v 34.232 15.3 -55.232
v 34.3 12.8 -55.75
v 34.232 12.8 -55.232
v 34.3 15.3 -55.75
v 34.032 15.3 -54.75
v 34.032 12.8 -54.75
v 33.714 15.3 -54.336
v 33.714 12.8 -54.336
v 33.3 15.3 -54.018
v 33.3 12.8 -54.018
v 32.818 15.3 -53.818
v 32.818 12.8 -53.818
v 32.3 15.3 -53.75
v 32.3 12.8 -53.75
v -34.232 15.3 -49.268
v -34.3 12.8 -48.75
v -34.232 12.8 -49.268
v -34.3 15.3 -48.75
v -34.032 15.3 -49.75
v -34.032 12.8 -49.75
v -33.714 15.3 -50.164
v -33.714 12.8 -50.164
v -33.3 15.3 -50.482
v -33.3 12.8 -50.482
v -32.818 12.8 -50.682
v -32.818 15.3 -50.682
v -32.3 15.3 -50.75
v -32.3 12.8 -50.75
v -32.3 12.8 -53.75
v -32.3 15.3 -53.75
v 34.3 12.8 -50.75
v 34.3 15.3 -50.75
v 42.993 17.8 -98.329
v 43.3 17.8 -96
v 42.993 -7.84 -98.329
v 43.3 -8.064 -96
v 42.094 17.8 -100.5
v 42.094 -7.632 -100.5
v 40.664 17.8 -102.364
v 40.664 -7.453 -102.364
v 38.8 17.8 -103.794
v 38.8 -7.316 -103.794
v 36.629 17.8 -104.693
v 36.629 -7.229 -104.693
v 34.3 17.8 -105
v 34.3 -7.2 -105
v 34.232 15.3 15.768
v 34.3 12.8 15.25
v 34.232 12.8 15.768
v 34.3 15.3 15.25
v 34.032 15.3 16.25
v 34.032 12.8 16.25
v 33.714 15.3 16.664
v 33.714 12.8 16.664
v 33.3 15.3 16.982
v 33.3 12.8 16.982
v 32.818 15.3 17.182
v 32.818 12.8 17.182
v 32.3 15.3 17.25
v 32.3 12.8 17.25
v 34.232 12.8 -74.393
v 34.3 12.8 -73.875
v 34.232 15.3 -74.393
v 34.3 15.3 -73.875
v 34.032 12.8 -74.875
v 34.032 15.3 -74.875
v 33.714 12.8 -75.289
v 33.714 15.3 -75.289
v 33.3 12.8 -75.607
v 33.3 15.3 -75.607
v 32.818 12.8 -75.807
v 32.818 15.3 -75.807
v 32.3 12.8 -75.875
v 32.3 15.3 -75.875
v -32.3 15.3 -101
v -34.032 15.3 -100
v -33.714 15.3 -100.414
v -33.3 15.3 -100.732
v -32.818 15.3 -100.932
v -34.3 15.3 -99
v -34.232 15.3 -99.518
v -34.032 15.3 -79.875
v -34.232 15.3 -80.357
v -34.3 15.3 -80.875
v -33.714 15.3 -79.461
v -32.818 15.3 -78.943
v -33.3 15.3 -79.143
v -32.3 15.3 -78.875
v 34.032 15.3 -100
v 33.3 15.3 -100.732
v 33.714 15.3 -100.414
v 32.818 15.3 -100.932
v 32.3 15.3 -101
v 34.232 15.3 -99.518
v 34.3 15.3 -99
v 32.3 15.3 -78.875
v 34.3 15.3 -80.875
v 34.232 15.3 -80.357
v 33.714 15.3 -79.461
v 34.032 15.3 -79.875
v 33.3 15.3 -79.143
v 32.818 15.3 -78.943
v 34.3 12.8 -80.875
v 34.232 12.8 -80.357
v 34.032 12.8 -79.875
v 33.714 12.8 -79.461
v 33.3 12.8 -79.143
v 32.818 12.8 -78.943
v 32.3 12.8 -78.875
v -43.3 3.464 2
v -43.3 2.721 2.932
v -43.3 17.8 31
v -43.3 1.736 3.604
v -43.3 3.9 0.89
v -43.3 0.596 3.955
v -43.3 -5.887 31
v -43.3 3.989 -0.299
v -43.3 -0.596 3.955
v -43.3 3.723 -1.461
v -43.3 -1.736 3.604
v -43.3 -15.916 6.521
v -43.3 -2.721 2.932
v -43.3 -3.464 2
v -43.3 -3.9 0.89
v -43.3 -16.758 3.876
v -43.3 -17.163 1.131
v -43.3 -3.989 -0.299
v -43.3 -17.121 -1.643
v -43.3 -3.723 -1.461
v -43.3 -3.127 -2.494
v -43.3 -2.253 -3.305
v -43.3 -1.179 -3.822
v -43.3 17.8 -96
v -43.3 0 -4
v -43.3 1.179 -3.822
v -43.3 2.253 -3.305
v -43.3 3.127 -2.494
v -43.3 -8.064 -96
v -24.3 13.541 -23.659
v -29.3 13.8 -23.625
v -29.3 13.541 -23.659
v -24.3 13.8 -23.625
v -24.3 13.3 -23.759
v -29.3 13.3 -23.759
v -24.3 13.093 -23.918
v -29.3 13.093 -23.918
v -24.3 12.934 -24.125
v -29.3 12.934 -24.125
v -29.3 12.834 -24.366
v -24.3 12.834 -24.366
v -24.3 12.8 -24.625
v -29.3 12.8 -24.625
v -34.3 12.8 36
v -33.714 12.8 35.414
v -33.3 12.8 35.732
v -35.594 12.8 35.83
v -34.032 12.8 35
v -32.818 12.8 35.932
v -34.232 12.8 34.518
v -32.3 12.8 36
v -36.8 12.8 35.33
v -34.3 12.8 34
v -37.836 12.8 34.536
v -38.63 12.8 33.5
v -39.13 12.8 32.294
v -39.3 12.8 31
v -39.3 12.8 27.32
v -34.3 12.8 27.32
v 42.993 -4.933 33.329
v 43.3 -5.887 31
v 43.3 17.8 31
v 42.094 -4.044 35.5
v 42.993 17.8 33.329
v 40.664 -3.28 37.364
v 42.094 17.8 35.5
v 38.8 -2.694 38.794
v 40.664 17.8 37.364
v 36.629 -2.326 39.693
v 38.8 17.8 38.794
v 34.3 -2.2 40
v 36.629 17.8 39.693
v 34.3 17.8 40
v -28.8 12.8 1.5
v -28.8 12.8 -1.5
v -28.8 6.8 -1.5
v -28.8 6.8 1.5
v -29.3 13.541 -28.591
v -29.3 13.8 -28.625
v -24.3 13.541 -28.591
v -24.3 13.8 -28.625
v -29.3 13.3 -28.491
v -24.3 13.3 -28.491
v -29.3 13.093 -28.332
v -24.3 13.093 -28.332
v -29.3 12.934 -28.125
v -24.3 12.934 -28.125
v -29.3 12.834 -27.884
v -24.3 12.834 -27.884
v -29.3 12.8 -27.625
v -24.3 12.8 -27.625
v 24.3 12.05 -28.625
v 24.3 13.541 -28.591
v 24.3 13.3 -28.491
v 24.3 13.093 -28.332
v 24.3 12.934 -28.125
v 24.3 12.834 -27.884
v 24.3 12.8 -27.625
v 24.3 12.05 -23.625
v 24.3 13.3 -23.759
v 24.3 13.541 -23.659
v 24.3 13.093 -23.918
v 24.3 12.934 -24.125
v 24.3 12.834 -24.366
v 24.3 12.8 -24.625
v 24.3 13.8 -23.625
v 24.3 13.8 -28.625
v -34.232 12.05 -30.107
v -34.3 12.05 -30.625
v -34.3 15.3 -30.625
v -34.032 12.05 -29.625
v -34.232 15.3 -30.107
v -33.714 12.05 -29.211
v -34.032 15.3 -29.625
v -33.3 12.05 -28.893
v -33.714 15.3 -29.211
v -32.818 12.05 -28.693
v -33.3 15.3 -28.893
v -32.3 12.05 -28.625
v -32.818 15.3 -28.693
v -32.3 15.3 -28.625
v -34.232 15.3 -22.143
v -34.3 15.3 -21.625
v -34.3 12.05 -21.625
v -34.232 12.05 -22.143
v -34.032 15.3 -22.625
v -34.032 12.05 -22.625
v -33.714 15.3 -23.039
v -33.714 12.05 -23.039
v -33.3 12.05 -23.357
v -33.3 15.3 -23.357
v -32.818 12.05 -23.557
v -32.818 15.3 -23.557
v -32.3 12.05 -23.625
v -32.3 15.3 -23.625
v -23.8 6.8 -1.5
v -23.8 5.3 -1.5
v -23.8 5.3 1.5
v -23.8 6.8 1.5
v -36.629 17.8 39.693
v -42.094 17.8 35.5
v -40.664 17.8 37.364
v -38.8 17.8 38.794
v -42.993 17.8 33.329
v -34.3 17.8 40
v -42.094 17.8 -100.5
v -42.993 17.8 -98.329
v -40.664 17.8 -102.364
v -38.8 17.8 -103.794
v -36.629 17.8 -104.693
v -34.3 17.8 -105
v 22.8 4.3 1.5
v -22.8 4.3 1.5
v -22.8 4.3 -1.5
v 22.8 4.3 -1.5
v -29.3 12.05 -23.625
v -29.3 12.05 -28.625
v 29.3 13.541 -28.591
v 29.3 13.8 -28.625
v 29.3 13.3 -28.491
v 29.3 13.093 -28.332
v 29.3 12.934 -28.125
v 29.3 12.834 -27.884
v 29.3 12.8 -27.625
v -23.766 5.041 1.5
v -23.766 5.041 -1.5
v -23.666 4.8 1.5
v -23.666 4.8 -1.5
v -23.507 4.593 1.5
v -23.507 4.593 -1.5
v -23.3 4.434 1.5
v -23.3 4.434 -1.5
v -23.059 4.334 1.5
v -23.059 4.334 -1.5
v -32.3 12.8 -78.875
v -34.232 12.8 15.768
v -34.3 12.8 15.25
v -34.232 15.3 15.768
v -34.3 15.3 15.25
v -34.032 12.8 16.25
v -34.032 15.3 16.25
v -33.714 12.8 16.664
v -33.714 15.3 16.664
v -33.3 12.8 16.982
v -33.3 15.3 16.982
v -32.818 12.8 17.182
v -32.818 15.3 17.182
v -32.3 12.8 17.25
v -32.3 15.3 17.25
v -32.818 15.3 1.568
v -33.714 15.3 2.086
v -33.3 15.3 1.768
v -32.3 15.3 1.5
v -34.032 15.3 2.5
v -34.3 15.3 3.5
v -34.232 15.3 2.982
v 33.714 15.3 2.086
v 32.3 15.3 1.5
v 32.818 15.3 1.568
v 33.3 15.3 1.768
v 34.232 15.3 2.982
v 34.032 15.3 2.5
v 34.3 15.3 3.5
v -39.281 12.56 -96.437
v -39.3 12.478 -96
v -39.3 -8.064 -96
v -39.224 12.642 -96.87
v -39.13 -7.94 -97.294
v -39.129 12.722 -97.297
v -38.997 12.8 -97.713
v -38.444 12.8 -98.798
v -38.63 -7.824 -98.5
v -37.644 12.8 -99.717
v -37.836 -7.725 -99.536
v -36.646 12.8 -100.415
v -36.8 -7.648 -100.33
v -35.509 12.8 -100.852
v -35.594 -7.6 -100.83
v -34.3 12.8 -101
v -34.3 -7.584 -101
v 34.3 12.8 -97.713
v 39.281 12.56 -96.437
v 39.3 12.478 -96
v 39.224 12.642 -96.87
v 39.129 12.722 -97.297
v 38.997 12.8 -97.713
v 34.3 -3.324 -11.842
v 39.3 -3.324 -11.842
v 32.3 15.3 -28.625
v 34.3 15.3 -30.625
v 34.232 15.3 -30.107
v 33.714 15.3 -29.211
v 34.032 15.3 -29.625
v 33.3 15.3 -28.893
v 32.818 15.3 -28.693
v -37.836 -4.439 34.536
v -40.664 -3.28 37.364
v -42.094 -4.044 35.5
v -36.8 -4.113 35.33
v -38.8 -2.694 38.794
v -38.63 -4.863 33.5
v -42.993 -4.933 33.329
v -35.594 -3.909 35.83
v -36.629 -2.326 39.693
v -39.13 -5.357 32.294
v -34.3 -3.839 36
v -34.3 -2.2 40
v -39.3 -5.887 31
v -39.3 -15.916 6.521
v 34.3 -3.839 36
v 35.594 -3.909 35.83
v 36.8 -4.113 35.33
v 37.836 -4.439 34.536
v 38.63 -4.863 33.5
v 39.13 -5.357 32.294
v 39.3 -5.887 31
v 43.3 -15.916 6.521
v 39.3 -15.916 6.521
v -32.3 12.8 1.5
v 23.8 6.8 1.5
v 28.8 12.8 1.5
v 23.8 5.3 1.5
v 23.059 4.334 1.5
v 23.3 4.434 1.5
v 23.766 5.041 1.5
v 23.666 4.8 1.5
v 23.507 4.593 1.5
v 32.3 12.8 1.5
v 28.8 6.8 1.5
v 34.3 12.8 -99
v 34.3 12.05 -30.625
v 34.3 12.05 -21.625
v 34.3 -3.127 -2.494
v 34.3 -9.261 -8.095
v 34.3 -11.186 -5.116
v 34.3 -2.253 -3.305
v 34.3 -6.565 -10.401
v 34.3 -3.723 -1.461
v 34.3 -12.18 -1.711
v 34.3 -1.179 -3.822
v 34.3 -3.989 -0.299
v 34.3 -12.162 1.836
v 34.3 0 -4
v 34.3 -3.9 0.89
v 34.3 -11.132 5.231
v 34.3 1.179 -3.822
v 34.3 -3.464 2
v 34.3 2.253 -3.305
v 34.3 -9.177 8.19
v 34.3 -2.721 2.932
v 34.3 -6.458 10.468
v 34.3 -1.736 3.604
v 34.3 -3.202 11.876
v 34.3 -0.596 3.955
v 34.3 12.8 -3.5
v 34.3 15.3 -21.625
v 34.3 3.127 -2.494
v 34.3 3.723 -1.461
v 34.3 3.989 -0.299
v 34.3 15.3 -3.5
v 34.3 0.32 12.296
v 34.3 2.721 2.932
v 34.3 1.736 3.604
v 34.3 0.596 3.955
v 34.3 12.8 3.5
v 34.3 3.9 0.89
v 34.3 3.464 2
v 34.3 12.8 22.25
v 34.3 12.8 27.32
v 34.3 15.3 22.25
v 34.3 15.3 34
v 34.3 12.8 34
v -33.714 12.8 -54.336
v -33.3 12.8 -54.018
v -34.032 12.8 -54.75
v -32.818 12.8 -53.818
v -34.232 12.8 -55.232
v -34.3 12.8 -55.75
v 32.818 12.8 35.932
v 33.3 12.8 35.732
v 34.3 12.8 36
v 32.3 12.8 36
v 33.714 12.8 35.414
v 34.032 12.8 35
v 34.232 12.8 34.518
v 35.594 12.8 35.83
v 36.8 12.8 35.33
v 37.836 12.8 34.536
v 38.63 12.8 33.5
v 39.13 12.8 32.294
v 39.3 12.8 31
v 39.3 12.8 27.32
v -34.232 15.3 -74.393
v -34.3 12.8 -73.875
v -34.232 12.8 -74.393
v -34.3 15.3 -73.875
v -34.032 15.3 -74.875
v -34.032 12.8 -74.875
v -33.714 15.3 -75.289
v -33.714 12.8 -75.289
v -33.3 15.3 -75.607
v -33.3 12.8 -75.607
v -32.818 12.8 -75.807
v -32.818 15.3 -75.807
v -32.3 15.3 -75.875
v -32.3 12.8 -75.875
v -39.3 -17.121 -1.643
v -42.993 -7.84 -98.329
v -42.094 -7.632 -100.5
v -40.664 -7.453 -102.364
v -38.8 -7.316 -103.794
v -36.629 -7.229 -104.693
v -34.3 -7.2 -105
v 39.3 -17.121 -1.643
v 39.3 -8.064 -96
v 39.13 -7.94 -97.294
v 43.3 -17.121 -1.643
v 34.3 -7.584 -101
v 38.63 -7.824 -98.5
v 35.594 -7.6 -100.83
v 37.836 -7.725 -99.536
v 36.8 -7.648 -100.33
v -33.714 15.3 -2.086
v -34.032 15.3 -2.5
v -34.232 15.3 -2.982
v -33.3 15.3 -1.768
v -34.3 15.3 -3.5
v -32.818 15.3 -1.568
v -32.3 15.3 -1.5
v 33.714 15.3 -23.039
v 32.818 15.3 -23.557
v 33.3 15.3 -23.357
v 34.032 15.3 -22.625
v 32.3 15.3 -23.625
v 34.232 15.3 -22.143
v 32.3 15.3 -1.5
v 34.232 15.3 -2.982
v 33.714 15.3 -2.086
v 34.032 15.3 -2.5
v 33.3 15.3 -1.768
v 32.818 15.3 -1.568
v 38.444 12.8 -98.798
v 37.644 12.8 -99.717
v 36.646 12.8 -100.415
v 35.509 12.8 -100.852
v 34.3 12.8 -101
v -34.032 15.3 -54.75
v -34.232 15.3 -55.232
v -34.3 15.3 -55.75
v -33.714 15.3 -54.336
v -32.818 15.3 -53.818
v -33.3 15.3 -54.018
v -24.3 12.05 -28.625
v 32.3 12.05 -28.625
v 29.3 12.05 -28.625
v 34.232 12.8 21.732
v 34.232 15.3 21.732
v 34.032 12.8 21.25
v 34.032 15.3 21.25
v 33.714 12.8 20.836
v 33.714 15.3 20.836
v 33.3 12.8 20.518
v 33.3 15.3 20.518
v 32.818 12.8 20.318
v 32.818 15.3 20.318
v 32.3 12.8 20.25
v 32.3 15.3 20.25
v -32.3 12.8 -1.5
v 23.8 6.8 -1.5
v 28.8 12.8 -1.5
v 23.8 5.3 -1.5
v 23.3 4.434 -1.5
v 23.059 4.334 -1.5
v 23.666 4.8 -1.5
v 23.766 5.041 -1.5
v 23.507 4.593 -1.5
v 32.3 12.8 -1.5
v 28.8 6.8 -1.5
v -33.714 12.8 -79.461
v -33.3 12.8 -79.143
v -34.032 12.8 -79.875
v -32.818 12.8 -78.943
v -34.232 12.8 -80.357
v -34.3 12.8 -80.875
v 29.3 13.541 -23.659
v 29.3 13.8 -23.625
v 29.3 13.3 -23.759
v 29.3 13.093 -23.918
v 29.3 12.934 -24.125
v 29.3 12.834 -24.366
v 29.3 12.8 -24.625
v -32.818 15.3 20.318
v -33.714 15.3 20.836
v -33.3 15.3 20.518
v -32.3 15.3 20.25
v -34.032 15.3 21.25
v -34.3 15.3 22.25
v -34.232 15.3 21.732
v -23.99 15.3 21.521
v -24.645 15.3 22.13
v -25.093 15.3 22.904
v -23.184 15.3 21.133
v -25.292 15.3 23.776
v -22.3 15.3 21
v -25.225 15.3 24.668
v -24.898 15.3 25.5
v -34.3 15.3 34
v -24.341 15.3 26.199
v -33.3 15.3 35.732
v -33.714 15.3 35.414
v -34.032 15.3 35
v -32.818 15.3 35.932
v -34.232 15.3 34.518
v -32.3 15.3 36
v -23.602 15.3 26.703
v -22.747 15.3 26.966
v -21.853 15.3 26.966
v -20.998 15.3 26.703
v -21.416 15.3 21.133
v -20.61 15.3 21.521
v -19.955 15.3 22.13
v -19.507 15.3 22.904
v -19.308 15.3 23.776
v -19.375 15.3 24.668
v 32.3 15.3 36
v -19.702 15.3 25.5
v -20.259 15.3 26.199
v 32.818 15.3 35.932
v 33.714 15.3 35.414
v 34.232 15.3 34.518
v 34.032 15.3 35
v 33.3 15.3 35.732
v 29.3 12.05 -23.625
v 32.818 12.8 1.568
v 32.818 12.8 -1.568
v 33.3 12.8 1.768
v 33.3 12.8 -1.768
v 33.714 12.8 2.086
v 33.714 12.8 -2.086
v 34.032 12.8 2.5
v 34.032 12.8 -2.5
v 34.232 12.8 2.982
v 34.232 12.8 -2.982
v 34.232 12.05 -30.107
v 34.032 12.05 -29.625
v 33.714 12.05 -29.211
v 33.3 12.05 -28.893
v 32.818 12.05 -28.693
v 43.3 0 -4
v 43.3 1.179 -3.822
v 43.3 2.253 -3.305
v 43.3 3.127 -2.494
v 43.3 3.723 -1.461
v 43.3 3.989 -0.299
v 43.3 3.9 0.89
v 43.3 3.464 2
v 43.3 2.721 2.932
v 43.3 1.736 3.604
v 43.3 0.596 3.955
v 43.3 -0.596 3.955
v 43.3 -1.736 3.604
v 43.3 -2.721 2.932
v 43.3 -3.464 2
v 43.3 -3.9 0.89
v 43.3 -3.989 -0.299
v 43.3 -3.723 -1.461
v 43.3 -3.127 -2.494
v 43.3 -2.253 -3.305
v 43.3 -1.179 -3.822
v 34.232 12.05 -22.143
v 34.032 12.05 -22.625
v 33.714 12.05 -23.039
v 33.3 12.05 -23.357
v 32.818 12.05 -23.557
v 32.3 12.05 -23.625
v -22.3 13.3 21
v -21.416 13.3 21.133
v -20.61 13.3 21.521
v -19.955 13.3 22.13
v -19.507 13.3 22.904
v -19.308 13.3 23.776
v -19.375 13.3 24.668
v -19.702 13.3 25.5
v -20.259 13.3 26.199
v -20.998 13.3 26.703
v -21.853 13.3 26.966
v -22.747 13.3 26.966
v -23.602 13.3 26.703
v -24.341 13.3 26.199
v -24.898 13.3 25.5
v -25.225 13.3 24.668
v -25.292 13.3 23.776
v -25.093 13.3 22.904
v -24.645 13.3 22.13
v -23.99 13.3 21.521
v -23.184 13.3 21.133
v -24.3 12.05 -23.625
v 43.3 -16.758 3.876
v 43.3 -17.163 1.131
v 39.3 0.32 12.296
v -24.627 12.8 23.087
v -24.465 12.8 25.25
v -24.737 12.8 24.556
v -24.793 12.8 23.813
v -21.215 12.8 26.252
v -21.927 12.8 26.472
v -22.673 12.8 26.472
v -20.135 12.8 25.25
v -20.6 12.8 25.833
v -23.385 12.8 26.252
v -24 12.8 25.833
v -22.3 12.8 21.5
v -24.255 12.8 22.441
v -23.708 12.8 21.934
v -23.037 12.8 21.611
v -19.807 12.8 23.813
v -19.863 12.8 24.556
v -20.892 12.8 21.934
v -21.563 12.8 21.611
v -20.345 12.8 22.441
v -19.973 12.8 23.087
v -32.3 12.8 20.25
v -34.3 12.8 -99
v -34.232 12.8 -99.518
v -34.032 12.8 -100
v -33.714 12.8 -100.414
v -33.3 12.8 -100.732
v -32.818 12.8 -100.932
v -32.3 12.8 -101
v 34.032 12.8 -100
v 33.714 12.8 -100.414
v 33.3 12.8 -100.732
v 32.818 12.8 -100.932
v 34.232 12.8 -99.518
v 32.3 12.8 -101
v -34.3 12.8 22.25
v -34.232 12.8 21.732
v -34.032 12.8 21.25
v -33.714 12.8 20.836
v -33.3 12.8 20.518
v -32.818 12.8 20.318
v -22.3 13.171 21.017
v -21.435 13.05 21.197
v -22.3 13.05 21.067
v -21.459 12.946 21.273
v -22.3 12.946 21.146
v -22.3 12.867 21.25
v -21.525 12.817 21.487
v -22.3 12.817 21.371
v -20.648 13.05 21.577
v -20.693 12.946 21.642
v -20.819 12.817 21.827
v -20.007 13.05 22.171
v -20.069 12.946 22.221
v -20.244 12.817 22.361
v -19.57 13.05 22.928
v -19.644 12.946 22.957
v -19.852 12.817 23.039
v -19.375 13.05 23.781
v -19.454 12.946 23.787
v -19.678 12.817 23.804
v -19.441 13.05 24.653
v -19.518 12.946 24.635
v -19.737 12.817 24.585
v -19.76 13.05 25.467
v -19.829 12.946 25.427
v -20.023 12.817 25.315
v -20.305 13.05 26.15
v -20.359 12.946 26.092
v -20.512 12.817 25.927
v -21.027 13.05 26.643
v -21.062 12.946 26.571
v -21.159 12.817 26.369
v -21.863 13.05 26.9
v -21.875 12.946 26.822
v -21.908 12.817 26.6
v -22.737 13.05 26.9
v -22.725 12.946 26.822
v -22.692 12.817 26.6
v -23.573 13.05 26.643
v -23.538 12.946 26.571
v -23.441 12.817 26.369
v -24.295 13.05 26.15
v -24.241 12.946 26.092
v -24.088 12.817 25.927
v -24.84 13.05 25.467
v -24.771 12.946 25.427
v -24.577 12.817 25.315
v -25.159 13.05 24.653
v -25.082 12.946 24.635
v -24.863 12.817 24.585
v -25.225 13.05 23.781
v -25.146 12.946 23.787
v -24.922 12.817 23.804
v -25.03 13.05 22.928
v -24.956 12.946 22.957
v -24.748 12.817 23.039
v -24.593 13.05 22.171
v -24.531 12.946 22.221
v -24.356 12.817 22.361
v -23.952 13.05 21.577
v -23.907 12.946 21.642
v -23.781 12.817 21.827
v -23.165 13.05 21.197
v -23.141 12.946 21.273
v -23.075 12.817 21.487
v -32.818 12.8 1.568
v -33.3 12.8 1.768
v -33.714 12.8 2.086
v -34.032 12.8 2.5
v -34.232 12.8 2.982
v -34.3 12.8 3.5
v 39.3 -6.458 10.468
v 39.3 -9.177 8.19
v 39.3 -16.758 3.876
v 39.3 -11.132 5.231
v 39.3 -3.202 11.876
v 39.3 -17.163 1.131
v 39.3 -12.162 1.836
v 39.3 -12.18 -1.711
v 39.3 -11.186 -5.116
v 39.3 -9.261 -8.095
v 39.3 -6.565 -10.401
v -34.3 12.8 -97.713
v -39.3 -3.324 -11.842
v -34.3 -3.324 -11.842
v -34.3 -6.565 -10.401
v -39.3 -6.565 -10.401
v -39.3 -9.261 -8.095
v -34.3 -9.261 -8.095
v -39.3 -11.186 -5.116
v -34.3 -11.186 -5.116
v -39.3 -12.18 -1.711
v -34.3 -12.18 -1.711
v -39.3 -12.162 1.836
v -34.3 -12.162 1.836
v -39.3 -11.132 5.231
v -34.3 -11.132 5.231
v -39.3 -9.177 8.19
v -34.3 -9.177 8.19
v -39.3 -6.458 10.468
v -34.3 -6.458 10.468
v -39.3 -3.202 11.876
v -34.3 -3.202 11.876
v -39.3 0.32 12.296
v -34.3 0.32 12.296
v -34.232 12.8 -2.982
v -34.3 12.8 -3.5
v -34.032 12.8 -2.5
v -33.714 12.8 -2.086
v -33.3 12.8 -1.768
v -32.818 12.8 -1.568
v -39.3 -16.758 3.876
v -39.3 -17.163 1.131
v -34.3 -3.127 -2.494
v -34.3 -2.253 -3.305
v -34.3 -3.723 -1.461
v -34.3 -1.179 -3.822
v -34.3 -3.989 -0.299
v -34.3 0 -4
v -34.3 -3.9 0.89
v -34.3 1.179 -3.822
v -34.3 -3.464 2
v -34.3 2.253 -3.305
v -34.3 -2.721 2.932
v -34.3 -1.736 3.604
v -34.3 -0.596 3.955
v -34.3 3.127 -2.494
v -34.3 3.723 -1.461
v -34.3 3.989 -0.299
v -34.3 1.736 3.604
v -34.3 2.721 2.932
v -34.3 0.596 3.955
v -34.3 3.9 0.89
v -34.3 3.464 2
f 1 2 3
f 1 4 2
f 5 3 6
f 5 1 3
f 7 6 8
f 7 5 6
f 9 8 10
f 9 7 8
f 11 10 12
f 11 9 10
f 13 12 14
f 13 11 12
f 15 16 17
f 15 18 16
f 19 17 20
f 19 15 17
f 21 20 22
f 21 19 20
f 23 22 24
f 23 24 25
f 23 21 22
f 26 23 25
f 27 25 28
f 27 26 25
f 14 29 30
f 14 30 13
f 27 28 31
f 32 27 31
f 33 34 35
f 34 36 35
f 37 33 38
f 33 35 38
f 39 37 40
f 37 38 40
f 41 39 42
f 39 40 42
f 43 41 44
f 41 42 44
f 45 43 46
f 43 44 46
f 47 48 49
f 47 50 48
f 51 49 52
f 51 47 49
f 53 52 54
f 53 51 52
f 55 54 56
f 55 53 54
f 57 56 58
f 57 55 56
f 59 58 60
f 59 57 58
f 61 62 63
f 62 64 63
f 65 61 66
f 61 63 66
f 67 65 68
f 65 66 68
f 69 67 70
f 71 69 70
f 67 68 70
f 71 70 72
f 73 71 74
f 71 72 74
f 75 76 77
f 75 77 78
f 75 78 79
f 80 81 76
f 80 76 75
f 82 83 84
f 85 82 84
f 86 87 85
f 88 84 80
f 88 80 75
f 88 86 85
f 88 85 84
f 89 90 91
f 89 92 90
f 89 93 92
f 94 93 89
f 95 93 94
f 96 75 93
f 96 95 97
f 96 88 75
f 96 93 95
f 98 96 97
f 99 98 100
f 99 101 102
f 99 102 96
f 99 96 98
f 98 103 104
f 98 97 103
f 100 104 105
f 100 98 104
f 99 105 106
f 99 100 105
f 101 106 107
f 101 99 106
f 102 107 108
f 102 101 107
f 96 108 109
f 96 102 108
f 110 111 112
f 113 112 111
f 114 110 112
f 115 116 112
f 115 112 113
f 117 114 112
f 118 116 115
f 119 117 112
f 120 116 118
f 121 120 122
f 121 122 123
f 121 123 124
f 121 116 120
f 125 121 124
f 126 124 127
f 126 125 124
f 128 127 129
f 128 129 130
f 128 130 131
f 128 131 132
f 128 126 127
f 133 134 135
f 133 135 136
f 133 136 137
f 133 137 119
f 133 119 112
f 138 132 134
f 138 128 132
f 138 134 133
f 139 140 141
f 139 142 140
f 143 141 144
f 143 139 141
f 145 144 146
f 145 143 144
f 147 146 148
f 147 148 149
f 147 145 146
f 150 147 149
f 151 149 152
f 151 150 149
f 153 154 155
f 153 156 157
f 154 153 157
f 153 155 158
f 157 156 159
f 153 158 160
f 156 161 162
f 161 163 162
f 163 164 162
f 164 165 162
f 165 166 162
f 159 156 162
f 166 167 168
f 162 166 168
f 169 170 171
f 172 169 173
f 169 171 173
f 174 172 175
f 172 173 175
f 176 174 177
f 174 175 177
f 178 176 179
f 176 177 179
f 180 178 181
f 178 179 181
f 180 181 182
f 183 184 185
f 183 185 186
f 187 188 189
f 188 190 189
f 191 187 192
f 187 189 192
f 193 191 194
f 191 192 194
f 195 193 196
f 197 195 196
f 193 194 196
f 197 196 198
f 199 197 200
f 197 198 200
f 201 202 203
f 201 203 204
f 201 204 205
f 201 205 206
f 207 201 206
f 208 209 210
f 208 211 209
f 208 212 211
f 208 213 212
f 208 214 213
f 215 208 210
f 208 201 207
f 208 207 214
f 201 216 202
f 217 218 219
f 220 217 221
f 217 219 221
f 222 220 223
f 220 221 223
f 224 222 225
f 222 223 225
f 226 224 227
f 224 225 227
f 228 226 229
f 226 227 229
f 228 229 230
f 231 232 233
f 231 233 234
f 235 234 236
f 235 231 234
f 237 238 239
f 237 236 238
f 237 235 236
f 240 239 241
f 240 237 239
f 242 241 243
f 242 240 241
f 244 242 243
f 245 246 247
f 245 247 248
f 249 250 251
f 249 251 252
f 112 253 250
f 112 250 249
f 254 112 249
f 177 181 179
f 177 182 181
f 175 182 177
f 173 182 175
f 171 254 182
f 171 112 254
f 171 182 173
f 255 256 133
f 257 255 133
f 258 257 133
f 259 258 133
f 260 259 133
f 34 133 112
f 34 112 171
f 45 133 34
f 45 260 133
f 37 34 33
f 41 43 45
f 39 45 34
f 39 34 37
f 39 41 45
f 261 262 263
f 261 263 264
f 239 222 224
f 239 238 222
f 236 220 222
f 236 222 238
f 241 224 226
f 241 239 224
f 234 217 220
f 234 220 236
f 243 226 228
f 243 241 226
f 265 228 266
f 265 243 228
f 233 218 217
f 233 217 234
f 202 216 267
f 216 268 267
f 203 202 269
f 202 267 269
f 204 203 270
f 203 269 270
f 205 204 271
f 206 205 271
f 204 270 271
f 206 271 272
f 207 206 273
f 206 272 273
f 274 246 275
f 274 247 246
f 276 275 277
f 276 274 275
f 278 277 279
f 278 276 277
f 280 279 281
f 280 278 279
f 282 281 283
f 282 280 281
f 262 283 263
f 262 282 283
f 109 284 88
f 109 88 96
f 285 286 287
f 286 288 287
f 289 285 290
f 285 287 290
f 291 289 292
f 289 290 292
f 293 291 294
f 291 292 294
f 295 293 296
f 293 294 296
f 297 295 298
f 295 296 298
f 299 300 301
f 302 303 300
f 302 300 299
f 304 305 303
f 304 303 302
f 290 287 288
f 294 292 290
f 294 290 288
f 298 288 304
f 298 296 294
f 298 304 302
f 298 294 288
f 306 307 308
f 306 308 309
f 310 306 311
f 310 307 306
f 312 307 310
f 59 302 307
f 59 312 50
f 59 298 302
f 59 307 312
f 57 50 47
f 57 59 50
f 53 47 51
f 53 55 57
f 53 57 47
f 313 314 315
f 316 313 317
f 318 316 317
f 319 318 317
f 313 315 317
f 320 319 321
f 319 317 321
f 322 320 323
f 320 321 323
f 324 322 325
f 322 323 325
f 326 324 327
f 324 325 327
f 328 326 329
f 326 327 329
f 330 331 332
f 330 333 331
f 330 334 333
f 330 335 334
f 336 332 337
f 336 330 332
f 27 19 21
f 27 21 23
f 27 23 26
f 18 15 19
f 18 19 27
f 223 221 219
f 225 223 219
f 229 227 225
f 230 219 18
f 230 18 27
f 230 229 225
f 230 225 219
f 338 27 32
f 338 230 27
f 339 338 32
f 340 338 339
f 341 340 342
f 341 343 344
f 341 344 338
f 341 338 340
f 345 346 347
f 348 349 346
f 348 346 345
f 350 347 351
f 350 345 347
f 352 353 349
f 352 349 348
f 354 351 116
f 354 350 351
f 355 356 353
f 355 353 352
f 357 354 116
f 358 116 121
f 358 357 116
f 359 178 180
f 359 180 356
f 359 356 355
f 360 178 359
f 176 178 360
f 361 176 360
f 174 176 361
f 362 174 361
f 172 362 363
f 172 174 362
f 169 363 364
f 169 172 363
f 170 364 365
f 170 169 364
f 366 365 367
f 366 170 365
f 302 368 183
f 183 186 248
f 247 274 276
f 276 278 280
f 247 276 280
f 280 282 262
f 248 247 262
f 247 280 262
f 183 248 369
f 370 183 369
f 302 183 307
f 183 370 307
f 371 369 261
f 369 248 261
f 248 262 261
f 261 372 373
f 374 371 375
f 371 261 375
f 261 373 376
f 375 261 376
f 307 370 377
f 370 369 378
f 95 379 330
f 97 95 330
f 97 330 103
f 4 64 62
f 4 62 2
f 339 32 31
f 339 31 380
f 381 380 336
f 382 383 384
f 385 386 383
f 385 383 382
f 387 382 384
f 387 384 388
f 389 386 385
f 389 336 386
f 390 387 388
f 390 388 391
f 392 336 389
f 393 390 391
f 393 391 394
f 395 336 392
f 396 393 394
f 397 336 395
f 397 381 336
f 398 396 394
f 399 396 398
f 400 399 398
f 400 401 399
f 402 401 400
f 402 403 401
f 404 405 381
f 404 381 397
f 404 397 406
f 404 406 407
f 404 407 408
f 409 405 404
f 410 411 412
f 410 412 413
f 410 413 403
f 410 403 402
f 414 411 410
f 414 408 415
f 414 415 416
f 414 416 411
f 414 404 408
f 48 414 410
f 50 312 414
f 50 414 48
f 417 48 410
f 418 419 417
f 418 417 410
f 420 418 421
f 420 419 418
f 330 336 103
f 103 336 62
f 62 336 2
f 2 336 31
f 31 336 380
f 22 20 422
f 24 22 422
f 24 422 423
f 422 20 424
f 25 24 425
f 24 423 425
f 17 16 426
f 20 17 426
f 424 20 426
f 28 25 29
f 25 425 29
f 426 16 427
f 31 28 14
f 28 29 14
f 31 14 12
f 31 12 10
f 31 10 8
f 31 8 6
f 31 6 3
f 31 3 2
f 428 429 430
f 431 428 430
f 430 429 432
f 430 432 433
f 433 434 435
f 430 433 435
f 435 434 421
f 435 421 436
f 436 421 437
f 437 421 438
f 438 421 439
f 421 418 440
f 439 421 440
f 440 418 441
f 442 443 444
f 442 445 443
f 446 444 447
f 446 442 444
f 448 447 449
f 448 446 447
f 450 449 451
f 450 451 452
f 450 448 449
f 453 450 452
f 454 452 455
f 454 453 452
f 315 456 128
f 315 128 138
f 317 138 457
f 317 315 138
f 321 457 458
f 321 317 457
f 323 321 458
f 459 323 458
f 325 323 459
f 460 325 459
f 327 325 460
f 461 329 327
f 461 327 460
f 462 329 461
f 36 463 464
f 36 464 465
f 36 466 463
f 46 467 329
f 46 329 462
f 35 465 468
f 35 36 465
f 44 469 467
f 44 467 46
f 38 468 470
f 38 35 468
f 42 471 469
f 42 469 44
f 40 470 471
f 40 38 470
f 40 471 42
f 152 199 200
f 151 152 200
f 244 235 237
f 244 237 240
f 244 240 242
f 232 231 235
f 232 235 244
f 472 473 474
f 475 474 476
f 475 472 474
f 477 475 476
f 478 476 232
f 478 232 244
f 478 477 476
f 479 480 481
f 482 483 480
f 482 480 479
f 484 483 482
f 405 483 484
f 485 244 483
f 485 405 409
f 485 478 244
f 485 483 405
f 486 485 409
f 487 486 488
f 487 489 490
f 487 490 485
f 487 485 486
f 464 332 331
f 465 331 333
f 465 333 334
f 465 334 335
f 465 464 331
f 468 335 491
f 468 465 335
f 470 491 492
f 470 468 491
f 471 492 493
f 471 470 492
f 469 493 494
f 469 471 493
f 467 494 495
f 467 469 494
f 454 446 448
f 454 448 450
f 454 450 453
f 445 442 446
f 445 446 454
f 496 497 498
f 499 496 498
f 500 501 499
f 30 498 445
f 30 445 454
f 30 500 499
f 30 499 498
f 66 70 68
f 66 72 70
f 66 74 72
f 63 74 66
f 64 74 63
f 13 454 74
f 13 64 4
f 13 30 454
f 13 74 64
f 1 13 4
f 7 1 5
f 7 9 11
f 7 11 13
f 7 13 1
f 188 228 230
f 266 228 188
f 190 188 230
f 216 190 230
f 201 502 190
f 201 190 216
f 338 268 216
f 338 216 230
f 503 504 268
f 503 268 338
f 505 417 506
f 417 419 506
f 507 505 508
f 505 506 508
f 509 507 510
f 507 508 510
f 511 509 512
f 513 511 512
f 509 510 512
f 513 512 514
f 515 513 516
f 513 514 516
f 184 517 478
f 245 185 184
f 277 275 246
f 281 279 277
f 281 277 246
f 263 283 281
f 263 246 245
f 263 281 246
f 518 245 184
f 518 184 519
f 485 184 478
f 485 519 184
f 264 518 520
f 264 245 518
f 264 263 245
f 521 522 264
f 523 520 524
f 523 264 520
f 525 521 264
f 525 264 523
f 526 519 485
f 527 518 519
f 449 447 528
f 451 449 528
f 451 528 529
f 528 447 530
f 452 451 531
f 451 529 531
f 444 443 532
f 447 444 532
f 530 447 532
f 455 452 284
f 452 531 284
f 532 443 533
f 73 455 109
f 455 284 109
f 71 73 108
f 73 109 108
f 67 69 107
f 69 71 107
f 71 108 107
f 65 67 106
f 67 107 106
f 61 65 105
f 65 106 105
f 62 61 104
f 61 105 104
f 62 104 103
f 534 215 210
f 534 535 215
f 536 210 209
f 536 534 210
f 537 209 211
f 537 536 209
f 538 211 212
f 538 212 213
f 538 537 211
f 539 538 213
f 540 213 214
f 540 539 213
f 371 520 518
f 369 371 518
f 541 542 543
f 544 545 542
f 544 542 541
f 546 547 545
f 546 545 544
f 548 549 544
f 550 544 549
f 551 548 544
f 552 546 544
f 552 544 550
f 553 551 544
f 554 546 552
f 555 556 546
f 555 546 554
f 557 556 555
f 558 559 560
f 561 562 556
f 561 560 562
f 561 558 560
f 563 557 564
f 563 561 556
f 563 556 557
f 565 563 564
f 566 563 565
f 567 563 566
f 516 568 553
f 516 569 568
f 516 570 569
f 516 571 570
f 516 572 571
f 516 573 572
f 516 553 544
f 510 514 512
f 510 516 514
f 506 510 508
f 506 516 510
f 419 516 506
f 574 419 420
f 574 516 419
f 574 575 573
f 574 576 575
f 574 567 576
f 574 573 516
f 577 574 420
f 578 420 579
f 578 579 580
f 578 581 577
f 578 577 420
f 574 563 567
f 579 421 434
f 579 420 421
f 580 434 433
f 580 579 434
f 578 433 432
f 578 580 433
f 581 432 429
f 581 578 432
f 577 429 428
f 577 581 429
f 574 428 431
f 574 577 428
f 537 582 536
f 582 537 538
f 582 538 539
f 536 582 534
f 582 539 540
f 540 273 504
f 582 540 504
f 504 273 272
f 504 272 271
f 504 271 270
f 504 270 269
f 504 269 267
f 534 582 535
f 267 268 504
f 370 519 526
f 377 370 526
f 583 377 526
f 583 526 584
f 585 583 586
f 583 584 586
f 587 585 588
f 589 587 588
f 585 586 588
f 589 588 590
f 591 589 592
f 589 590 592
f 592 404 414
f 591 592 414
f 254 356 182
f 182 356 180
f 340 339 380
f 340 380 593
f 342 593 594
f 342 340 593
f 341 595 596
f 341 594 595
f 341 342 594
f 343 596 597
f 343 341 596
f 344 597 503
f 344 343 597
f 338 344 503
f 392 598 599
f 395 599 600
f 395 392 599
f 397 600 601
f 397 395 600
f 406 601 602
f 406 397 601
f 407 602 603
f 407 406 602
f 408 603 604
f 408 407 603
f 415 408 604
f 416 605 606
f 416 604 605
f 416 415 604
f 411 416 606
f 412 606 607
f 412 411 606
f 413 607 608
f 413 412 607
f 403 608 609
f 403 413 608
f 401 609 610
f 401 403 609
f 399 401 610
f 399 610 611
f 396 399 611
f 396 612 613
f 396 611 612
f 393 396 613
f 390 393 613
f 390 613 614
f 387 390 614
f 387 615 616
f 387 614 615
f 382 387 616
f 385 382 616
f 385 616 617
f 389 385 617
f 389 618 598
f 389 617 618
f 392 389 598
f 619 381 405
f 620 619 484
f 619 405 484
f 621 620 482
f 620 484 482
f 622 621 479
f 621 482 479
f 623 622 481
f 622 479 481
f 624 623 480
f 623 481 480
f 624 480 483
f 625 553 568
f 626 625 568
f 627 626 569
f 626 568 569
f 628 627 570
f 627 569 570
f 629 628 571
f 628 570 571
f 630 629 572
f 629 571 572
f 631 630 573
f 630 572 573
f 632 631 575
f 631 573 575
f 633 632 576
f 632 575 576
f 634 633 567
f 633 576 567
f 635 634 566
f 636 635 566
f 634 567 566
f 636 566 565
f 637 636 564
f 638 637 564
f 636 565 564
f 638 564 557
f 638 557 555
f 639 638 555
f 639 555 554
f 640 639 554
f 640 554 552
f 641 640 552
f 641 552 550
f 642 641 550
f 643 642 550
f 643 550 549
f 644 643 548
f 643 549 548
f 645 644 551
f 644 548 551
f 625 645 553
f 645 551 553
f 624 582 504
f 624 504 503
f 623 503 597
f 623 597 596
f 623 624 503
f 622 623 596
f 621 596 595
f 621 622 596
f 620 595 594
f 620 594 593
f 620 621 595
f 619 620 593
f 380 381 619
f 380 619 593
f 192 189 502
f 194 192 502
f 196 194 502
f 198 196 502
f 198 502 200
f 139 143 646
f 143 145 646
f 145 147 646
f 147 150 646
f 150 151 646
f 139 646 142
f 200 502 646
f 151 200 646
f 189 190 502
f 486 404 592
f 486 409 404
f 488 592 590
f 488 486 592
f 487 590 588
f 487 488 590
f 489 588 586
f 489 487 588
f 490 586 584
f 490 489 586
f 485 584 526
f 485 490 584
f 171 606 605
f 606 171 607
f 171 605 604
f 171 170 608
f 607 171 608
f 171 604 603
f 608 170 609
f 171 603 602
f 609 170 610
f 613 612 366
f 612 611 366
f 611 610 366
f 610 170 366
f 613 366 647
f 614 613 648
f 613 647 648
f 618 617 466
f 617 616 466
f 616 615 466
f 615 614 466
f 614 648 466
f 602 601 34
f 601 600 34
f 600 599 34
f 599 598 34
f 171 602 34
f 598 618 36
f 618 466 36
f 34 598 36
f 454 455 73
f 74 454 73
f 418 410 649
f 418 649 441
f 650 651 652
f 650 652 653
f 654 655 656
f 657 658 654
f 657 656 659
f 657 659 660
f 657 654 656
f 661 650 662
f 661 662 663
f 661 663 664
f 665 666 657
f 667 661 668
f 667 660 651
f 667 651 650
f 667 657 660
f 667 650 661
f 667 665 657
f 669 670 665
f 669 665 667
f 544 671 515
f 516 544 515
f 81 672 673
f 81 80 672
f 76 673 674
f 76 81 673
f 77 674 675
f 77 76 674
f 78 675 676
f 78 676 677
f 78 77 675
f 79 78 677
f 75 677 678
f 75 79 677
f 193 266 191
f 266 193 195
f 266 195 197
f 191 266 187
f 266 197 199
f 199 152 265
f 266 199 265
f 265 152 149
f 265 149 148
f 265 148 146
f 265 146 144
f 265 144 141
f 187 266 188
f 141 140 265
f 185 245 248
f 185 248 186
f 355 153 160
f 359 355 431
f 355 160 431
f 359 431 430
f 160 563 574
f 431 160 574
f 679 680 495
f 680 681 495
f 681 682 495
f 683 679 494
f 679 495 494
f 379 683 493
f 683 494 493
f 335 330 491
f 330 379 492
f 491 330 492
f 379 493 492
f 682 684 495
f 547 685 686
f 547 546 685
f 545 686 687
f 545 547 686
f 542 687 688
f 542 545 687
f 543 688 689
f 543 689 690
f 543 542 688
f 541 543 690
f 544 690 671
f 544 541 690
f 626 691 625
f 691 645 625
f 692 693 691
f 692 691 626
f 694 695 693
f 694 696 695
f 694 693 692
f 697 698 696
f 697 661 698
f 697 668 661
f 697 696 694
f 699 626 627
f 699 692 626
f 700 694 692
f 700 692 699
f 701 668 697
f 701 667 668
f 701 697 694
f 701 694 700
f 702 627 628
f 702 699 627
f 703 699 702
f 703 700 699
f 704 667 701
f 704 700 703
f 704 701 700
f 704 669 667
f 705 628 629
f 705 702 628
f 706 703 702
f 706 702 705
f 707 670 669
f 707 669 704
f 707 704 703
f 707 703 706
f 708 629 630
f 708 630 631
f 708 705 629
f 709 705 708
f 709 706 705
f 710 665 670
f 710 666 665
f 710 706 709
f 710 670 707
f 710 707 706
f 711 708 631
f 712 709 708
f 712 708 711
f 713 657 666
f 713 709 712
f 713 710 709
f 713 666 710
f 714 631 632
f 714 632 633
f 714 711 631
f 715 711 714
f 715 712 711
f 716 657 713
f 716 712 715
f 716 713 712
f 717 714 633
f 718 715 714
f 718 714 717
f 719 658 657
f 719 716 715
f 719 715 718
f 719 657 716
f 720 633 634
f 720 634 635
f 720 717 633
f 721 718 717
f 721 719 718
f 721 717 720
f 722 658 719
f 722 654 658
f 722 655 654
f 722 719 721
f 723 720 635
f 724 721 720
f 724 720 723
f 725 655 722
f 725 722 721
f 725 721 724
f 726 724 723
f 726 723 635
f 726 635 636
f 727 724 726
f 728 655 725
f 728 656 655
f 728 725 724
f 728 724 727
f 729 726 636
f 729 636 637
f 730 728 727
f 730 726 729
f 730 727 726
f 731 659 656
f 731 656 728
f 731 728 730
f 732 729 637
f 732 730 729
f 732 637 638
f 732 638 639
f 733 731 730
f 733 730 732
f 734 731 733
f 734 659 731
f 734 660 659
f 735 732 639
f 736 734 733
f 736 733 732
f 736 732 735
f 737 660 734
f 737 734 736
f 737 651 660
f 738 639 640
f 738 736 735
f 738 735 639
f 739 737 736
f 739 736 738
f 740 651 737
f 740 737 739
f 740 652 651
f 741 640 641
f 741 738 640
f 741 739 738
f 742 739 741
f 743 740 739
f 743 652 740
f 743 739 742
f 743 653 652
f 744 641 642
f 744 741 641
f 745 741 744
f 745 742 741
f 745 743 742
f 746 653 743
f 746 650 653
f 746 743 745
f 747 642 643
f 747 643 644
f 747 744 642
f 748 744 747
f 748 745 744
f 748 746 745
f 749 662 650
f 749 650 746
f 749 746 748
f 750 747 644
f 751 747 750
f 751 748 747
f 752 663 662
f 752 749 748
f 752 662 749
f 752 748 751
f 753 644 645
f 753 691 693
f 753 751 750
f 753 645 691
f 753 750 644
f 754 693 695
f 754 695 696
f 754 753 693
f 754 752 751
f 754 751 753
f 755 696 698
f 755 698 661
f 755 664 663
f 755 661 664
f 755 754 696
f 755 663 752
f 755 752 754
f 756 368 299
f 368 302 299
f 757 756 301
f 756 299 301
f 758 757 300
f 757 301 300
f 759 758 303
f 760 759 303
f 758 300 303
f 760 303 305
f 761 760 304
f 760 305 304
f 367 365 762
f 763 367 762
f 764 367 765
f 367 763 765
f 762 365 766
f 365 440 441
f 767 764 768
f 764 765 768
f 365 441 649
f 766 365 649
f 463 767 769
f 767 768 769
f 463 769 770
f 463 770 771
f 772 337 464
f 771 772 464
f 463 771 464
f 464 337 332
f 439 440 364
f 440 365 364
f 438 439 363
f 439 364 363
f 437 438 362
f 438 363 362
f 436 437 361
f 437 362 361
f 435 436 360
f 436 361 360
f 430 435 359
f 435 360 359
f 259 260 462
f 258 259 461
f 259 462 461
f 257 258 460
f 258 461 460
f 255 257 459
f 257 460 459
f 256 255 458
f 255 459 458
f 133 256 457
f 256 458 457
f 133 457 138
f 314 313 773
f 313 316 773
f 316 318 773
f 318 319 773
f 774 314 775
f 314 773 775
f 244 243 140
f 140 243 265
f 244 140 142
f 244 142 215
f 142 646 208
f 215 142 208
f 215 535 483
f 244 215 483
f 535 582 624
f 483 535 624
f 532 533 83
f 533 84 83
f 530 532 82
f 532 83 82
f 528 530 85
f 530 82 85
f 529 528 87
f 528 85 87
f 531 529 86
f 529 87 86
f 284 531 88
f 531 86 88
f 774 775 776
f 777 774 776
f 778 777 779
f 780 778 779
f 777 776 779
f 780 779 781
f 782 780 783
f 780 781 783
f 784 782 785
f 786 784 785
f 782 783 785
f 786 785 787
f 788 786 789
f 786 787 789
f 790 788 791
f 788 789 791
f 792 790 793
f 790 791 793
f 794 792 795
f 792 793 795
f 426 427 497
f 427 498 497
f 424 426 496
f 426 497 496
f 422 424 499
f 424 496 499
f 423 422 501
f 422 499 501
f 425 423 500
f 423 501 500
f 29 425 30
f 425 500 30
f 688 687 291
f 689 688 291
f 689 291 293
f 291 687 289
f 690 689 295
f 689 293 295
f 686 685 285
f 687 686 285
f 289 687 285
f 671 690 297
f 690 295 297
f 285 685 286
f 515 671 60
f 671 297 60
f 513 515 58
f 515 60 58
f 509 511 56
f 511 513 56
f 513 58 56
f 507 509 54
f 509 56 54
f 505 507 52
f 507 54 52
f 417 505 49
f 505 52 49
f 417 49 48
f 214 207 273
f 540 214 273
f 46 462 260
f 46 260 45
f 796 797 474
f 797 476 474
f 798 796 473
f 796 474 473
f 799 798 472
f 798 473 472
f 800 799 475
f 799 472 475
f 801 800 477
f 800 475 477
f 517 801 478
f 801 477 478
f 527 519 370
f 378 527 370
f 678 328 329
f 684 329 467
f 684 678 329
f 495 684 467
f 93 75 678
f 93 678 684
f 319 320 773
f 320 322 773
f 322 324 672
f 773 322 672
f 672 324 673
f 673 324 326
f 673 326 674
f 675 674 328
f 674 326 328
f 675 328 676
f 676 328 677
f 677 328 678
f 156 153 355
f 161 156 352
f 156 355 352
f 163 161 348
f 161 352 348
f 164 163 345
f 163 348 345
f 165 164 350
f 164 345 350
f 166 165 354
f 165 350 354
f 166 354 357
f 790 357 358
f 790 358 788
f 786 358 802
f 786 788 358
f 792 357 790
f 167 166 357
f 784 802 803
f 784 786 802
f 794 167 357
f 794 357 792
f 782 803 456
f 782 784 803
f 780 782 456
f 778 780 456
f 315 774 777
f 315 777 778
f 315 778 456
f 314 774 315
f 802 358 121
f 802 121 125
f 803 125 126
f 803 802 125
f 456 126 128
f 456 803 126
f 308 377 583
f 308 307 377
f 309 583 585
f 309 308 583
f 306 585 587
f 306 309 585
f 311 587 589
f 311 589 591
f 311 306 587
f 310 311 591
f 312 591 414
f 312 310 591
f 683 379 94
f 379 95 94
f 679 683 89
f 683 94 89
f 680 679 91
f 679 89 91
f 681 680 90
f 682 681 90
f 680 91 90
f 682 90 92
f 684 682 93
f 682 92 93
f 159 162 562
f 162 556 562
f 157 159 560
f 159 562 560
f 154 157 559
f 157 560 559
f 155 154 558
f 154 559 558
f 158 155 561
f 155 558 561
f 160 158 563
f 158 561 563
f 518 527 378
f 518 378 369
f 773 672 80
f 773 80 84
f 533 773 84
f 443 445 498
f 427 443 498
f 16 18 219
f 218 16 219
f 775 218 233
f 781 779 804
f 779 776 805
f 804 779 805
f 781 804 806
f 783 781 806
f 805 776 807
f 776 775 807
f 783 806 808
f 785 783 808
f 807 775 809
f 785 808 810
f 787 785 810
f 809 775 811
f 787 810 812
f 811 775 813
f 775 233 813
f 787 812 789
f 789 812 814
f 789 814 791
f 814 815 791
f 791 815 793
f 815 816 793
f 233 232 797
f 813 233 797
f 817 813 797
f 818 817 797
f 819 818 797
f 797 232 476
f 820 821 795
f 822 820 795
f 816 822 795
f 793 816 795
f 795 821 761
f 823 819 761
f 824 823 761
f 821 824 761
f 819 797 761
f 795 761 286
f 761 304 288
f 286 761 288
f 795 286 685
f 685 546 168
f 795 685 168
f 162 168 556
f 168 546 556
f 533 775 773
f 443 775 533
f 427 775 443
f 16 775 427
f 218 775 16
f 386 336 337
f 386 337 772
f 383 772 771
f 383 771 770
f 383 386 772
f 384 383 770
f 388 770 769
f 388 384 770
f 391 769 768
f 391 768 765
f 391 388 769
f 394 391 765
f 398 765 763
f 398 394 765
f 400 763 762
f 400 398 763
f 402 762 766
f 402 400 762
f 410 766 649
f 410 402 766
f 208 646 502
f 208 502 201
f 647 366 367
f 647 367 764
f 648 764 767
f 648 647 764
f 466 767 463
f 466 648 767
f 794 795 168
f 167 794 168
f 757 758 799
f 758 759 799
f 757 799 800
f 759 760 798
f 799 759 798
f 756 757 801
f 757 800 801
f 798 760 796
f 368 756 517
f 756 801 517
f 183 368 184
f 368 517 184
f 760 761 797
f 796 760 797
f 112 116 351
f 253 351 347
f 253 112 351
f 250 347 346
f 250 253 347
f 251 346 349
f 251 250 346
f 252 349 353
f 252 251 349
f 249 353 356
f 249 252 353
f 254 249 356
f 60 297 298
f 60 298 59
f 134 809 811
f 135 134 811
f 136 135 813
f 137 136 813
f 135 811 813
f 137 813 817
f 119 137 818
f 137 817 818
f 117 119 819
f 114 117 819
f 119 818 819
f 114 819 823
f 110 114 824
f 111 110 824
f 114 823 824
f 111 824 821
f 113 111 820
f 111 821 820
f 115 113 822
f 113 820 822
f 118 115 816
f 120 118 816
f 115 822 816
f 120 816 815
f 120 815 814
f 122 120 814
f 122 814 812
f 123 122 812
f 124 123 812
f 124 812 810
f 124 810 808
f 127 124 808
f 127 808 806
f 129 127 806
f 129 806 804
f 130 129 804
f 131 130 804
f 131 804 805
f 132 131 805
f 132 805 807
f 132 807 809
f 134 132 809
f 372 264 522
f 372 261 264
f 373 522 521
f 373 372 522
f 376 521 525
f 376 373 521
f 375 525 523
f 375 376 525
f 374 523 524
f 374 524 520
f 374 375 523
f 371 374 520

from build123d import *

# Parameters (mm, degrees)
SKETCH4_W           = 86.6
SKETCH4_H           = 145
SKETCH4_W_2         = 78.6
SKETCH4_H_2         = 137
BOSS_EXTRUDE2_DEPTH = 30
SKETCH5_W           = 86.6
SKETCH5_H           = 145
BOSS_EXTRUDE3_DEPTH = 5
SKETCH6_R           = 4
CUT_EXTRUDE2_DEPTH  = 56.5
BOSS_EXTRUDE1_START = 5
SKETCH1_R           = 4
BOSS_EXTRUDE1_DEPTH = 5
SKETCH7_W           = 68.6
SKETCH7_H           = 15.75
SKETCH7_H_2         = 22.125
CUT_EXTRUDE3_DEPTH  = 2.5
FILLET1_R           = 9
SKETCH12_W          = 57.6
SKETCH12_H          = 3
BOSS_EXTRUDE6_DEPTH = 8.5
SKETCH13_W          = 5
SKETCH13_H          = 2.5
CUT_EXTRUDE4_DEPTH  = 5
FILLET6_R           = 1
FILLET2_R           = 2
FILLET3_R           = 5
SKETCH10_R          = 3
BOSS_EXTRUDE4_DEPTH = 2.5
FILLET4_R           = 0.5
SKETCH11_W          = 48.6
SKETCH11_H          = 5
BOSS_EXTRUDE5_DEPTH = 0.75
FILLET5_R           = 1


with BuildPart() as part:
    # Sketch4 → Boss-Extrude2 (new body)
    with BuildSketch(Plane(origin=(0, 12.8, 0), x_dir=(1, 0, 0), z_dir=(0, 1, 0))):
        with Locations((0, 32.5)):
            Rectangle(SKETCH4_W, SKETCH4_H)
        with Locations((0, 32.5)):
            Rectangle(SKETCH4_W_2, SKETCH4_H_2, mode=Mode.SUBTRACT)
    extrude(amount=-BOSS_EXTRUDE2_DEPTH)

    # Sketch5 → Boss-Extrude3 (add)
    with BuildSketch(Plane(origin=(0, 12.8, 0), x_dir=(1, 0, 0), z_dir=(0, 1, 0))):
        with Locations((0, 32.5)):
            Rectangle(SKETCH5_W, SKETCH5_H)
    extrude(amount=BOSS_EXTRUDE3_DEPTH)

    # Sketch6 → Cut-Extrude2 (cut, symmetric)
    with BuildSketch(Plane(origin=(0, 0, 0), x_dir=(0, 0, -1), z_dir=(1, 0, 0))):
        Circle(SKETCH6_R)
        with BuildLine():
            Line((-40, -2.2), (-6.520615654, -15.916079024))
            ThreePointArc((-6.520615654, -15.916079024), (-2.511916424, -17.015589202), (1.643491767, -17.121300617))
            Line((1.643491767, -17.121300617), (105, -7.2))
            Line((105, -7.2), (105, -30))
            Line((105, -30), (-40, -30))
            Line((-40, -30), (-40, -2.2))
        make_face()
    extrude(amount=CUT_EXTRUDE2_DEPTH, both=True, mode=Mode.SUBTRACT)

    # Sketch1 → Boss-Extrude1 (add)
    with BuildSketch(Plane(origin=(-39.3, 0, 0), x_dir=(0, 0, -1), z_dir=(1, 0, 0)).offset(BOSS_EXTRUDE1_START)):
        with BuildLine():
            Line((-12.295827489, 0.320353501), (-27.31993911, 12.8))
            Line((-27.31993911, 12.8), (97.713486421, 12.8))
            Line((97.713486421, 12.8), (11.842309408, -3.324110088))
            ThreePointArc((11.842309408, -3.324110088), (-1.836286572, -12.162156537), (-12.295827489, 0.320353501))
        make_face()
        Circle(SKETCH1_R, mode=Mode.SUBTRACT)
    boss_extrude1 = extrude(amount=-BOSS_EXTRUDE1_DEPTH)

    # Mirror1: Boss-Extrude1 across plane
    add(boss_extrude1.mirror(Plane(origin=(0, 0, 0), x_dir=(0, 0, 1), z_dir=(1, 0, 0))))

    # Sketch7 → Cut-Extrude3 (cut)
    with BuildSketch(Plane.XZ.offset(-12.8)):
        with Locations((0, 28.125)):
            Rectangle(SKETCH7_W, SKETCH7_H)
        with Locations((0, -89.9375)):
            Rectangle(SKETCH7_W, SKETCH7_H_2)
        with Locations((0, 9.375)):
            Rectangle(SKETCH7_W, SKETCH7_H)
        with Locations((0, -12.5625)):
            Rectangle(SKETCH7_W, SKETCH7_H_2)
        with Locations((0, -39.6875)):
            Rectangle(SKETCH7_W, SKETCH7_H_2)
        with Locations((0, -64.8125)):
            Rectangle(SKETCH7_W, SKETCH7_H_2)
    extrude(amount=-CUT_EXTRUDE3_DEPTH, mode=Mode.SUBTRACT)

    # Fillet1
    fillet1_edges = [part.edges().sort_by_distance(p)[0] for p in [
        (43.3, 7.8, 40),
        (-43.3, 7.8, 40),
        (43.3, 5.3, -105),
        (-43.3, 5.3, -105),
    ]]
    fillet(fillet1_edges, radius=FILLET1_R)

    # Sketch12 → Boss-Extrude6 (add)
    with BuildSketch(Plane.XZ.offset(-12.8)):
        Rectangle(SKETCH12_W, SKETCH12_H)
    extrude(amount=BOSS_EXTRUDE6_DEPTH)

    # Sketch13 → Cut-Extrude4 (cut)
    with BuildSketch(Plane(origin=(0, 0, -1.5), x_dir=(-1, 0, 0), z_dir=(0, 0, -1))):
        with Locations((-26.3, 5.55)):
            Rectangle(SKETCH13_W, SKETCH13_H)
        with Locations((26.3, 5.55)):
            Rectangle(SKETCH13_W, SKETCH13_H)
    extrude(amount=-CUT_EXTRUDE4_DEPTH, mode=Mode.SUBTRACT)

    # Fillet6
    fillet6_edges = [part.edges().sort_by_distance(p)[0] for p in [
        (-23.8, 4.3, 0),
        (23.8, 4.3, 0),
    ]]
    fillet(fillet6_edges, radius=FILLET6_R)

    # Fillet2
    fillet2_edges = [part.edges().sort_by_distance(p)[0] for p in [
        (-34.3, 14.05, 20.25),
        (-34.3, 14.05, 36),
        (34.3, 14.05, 36),
        (34.3, 14.05, 20.25),
        (-34.3, 14.05, -75.875),
        (-34.3, 14.05, -53.75),
        (34.3, 14.05, -53.75),
        (34.3, 14.05, -75.875),
        (34.3, 14.05, -78.875),
        (34.3, 14.05, -101),
        (-34.3, 14.05, -101),
        (-34.3, 14.05, -78.875),
        (-34.3, 14.05, 1.5),
        (-34.3, 14.05, 17.25),
        (34.3, 14.05, 17.25),
        (34.3, 14.05, 1.5),
        (-34.3, 14.05, -23.625),
        (-34.3, 14.05, -1.5),
        (34.3, 14.05, -1.5),
        (34.3, 14.05, -23.625),
        (-34.3, 14.05, -50.75),
        (-34.3, 14.05, -28.625),
        (34.3, 14.05, -28.625),
    ]]
    fillet(fillet2_edges, radius=FILLET2_R)

    # Fillet3
    fillet3_edges = [part.edges().sort_by_distance(p)[0] for p in [
        (39.3, 4.480625373, 36),
        (-39.3, 4.480625373, 36),
        (39.3, 2.608017883, -101),
        (-39.3, 2.608017883, -101),
    ]]
    fillet(fillet3_edges, radius=FILLET3_R)

    # Sketch10 → Boss-Extrude4 (add)
    with BuildSketch(Plane.XZ.offset(-15.3)):
        with Locations(Location((-22.3, 24, 0), (0, 0, 270))):
            Circle(SKETCH10_R)
    extrude(amount=BOSS_EXTRUDE4_DEPTH)

    # Fillet4
    fillet4_edges = [part.edges().sort_by_distance(p)[0] for p in [
        (-22.3, 12.8, 27),
    ]]
    fillet(fillet4_edges, radius=FILLET4_R)

    # Sketch11 → Boss-Extrude5 (add, symmetric)
    with BuildSketch(Plane.XZ.offset(-12.8)):
        with BuildLine():
            Line((-29.3, -23.625), (-32.3, -23.625))
            ThreePointArc((-32.3, -23.625), (-33.714213562, -23.039213562), (-34.3, -21.625))
            Line((-34.3, -21.625), (-34.3, -30.625))
            ThreePointArc((-34.3, -30.625), (-33.714213562, -29.210786438), (-32.3, -28.625))
            Line((-32.3, -28.625), (-29.3, -28.625))
            Line((-29.3, -28.625), (-29.3, -23.625))
        make_face()
        with BuildLine():
            Line((32.3, -23.625), (29.3, -23.625))
            Line((29.3, -23.625), (29.3, -28.625))
            Line((29.3, -28.625), (32.3, -28.625))
            ThreePointArc((32.3, -28.625), (33.714213562, -29.210786438), (34.3, -30.625))
            Line((34.3, -30.625), (34.3, -21.625))
            ThreePointArc((34.3, -21.625), (33.714213562, -23.039213562), (32.3, -23.625))
        make_face()
        with Locations((0, -26.125)):
            Rectangle(SKETCH11_W, SKETCH11_H)
    extrude(amount=BOSS_EXTRUDE5_DEPTH, both=True)

    # Fillet5
    fillet5_edges = [part.edges().sort_by_distance(p)[0] for p in [
        (26.8, 12.8, -28.625),
        (-26.8, 12.8, -23.625),
        (26.8, 12.8, -23.625),
        (-26.8, 12.8, -28.625),
    ]]
    fillet(fillet5_edges, radius=FILLET5_R)


solid = part.part
